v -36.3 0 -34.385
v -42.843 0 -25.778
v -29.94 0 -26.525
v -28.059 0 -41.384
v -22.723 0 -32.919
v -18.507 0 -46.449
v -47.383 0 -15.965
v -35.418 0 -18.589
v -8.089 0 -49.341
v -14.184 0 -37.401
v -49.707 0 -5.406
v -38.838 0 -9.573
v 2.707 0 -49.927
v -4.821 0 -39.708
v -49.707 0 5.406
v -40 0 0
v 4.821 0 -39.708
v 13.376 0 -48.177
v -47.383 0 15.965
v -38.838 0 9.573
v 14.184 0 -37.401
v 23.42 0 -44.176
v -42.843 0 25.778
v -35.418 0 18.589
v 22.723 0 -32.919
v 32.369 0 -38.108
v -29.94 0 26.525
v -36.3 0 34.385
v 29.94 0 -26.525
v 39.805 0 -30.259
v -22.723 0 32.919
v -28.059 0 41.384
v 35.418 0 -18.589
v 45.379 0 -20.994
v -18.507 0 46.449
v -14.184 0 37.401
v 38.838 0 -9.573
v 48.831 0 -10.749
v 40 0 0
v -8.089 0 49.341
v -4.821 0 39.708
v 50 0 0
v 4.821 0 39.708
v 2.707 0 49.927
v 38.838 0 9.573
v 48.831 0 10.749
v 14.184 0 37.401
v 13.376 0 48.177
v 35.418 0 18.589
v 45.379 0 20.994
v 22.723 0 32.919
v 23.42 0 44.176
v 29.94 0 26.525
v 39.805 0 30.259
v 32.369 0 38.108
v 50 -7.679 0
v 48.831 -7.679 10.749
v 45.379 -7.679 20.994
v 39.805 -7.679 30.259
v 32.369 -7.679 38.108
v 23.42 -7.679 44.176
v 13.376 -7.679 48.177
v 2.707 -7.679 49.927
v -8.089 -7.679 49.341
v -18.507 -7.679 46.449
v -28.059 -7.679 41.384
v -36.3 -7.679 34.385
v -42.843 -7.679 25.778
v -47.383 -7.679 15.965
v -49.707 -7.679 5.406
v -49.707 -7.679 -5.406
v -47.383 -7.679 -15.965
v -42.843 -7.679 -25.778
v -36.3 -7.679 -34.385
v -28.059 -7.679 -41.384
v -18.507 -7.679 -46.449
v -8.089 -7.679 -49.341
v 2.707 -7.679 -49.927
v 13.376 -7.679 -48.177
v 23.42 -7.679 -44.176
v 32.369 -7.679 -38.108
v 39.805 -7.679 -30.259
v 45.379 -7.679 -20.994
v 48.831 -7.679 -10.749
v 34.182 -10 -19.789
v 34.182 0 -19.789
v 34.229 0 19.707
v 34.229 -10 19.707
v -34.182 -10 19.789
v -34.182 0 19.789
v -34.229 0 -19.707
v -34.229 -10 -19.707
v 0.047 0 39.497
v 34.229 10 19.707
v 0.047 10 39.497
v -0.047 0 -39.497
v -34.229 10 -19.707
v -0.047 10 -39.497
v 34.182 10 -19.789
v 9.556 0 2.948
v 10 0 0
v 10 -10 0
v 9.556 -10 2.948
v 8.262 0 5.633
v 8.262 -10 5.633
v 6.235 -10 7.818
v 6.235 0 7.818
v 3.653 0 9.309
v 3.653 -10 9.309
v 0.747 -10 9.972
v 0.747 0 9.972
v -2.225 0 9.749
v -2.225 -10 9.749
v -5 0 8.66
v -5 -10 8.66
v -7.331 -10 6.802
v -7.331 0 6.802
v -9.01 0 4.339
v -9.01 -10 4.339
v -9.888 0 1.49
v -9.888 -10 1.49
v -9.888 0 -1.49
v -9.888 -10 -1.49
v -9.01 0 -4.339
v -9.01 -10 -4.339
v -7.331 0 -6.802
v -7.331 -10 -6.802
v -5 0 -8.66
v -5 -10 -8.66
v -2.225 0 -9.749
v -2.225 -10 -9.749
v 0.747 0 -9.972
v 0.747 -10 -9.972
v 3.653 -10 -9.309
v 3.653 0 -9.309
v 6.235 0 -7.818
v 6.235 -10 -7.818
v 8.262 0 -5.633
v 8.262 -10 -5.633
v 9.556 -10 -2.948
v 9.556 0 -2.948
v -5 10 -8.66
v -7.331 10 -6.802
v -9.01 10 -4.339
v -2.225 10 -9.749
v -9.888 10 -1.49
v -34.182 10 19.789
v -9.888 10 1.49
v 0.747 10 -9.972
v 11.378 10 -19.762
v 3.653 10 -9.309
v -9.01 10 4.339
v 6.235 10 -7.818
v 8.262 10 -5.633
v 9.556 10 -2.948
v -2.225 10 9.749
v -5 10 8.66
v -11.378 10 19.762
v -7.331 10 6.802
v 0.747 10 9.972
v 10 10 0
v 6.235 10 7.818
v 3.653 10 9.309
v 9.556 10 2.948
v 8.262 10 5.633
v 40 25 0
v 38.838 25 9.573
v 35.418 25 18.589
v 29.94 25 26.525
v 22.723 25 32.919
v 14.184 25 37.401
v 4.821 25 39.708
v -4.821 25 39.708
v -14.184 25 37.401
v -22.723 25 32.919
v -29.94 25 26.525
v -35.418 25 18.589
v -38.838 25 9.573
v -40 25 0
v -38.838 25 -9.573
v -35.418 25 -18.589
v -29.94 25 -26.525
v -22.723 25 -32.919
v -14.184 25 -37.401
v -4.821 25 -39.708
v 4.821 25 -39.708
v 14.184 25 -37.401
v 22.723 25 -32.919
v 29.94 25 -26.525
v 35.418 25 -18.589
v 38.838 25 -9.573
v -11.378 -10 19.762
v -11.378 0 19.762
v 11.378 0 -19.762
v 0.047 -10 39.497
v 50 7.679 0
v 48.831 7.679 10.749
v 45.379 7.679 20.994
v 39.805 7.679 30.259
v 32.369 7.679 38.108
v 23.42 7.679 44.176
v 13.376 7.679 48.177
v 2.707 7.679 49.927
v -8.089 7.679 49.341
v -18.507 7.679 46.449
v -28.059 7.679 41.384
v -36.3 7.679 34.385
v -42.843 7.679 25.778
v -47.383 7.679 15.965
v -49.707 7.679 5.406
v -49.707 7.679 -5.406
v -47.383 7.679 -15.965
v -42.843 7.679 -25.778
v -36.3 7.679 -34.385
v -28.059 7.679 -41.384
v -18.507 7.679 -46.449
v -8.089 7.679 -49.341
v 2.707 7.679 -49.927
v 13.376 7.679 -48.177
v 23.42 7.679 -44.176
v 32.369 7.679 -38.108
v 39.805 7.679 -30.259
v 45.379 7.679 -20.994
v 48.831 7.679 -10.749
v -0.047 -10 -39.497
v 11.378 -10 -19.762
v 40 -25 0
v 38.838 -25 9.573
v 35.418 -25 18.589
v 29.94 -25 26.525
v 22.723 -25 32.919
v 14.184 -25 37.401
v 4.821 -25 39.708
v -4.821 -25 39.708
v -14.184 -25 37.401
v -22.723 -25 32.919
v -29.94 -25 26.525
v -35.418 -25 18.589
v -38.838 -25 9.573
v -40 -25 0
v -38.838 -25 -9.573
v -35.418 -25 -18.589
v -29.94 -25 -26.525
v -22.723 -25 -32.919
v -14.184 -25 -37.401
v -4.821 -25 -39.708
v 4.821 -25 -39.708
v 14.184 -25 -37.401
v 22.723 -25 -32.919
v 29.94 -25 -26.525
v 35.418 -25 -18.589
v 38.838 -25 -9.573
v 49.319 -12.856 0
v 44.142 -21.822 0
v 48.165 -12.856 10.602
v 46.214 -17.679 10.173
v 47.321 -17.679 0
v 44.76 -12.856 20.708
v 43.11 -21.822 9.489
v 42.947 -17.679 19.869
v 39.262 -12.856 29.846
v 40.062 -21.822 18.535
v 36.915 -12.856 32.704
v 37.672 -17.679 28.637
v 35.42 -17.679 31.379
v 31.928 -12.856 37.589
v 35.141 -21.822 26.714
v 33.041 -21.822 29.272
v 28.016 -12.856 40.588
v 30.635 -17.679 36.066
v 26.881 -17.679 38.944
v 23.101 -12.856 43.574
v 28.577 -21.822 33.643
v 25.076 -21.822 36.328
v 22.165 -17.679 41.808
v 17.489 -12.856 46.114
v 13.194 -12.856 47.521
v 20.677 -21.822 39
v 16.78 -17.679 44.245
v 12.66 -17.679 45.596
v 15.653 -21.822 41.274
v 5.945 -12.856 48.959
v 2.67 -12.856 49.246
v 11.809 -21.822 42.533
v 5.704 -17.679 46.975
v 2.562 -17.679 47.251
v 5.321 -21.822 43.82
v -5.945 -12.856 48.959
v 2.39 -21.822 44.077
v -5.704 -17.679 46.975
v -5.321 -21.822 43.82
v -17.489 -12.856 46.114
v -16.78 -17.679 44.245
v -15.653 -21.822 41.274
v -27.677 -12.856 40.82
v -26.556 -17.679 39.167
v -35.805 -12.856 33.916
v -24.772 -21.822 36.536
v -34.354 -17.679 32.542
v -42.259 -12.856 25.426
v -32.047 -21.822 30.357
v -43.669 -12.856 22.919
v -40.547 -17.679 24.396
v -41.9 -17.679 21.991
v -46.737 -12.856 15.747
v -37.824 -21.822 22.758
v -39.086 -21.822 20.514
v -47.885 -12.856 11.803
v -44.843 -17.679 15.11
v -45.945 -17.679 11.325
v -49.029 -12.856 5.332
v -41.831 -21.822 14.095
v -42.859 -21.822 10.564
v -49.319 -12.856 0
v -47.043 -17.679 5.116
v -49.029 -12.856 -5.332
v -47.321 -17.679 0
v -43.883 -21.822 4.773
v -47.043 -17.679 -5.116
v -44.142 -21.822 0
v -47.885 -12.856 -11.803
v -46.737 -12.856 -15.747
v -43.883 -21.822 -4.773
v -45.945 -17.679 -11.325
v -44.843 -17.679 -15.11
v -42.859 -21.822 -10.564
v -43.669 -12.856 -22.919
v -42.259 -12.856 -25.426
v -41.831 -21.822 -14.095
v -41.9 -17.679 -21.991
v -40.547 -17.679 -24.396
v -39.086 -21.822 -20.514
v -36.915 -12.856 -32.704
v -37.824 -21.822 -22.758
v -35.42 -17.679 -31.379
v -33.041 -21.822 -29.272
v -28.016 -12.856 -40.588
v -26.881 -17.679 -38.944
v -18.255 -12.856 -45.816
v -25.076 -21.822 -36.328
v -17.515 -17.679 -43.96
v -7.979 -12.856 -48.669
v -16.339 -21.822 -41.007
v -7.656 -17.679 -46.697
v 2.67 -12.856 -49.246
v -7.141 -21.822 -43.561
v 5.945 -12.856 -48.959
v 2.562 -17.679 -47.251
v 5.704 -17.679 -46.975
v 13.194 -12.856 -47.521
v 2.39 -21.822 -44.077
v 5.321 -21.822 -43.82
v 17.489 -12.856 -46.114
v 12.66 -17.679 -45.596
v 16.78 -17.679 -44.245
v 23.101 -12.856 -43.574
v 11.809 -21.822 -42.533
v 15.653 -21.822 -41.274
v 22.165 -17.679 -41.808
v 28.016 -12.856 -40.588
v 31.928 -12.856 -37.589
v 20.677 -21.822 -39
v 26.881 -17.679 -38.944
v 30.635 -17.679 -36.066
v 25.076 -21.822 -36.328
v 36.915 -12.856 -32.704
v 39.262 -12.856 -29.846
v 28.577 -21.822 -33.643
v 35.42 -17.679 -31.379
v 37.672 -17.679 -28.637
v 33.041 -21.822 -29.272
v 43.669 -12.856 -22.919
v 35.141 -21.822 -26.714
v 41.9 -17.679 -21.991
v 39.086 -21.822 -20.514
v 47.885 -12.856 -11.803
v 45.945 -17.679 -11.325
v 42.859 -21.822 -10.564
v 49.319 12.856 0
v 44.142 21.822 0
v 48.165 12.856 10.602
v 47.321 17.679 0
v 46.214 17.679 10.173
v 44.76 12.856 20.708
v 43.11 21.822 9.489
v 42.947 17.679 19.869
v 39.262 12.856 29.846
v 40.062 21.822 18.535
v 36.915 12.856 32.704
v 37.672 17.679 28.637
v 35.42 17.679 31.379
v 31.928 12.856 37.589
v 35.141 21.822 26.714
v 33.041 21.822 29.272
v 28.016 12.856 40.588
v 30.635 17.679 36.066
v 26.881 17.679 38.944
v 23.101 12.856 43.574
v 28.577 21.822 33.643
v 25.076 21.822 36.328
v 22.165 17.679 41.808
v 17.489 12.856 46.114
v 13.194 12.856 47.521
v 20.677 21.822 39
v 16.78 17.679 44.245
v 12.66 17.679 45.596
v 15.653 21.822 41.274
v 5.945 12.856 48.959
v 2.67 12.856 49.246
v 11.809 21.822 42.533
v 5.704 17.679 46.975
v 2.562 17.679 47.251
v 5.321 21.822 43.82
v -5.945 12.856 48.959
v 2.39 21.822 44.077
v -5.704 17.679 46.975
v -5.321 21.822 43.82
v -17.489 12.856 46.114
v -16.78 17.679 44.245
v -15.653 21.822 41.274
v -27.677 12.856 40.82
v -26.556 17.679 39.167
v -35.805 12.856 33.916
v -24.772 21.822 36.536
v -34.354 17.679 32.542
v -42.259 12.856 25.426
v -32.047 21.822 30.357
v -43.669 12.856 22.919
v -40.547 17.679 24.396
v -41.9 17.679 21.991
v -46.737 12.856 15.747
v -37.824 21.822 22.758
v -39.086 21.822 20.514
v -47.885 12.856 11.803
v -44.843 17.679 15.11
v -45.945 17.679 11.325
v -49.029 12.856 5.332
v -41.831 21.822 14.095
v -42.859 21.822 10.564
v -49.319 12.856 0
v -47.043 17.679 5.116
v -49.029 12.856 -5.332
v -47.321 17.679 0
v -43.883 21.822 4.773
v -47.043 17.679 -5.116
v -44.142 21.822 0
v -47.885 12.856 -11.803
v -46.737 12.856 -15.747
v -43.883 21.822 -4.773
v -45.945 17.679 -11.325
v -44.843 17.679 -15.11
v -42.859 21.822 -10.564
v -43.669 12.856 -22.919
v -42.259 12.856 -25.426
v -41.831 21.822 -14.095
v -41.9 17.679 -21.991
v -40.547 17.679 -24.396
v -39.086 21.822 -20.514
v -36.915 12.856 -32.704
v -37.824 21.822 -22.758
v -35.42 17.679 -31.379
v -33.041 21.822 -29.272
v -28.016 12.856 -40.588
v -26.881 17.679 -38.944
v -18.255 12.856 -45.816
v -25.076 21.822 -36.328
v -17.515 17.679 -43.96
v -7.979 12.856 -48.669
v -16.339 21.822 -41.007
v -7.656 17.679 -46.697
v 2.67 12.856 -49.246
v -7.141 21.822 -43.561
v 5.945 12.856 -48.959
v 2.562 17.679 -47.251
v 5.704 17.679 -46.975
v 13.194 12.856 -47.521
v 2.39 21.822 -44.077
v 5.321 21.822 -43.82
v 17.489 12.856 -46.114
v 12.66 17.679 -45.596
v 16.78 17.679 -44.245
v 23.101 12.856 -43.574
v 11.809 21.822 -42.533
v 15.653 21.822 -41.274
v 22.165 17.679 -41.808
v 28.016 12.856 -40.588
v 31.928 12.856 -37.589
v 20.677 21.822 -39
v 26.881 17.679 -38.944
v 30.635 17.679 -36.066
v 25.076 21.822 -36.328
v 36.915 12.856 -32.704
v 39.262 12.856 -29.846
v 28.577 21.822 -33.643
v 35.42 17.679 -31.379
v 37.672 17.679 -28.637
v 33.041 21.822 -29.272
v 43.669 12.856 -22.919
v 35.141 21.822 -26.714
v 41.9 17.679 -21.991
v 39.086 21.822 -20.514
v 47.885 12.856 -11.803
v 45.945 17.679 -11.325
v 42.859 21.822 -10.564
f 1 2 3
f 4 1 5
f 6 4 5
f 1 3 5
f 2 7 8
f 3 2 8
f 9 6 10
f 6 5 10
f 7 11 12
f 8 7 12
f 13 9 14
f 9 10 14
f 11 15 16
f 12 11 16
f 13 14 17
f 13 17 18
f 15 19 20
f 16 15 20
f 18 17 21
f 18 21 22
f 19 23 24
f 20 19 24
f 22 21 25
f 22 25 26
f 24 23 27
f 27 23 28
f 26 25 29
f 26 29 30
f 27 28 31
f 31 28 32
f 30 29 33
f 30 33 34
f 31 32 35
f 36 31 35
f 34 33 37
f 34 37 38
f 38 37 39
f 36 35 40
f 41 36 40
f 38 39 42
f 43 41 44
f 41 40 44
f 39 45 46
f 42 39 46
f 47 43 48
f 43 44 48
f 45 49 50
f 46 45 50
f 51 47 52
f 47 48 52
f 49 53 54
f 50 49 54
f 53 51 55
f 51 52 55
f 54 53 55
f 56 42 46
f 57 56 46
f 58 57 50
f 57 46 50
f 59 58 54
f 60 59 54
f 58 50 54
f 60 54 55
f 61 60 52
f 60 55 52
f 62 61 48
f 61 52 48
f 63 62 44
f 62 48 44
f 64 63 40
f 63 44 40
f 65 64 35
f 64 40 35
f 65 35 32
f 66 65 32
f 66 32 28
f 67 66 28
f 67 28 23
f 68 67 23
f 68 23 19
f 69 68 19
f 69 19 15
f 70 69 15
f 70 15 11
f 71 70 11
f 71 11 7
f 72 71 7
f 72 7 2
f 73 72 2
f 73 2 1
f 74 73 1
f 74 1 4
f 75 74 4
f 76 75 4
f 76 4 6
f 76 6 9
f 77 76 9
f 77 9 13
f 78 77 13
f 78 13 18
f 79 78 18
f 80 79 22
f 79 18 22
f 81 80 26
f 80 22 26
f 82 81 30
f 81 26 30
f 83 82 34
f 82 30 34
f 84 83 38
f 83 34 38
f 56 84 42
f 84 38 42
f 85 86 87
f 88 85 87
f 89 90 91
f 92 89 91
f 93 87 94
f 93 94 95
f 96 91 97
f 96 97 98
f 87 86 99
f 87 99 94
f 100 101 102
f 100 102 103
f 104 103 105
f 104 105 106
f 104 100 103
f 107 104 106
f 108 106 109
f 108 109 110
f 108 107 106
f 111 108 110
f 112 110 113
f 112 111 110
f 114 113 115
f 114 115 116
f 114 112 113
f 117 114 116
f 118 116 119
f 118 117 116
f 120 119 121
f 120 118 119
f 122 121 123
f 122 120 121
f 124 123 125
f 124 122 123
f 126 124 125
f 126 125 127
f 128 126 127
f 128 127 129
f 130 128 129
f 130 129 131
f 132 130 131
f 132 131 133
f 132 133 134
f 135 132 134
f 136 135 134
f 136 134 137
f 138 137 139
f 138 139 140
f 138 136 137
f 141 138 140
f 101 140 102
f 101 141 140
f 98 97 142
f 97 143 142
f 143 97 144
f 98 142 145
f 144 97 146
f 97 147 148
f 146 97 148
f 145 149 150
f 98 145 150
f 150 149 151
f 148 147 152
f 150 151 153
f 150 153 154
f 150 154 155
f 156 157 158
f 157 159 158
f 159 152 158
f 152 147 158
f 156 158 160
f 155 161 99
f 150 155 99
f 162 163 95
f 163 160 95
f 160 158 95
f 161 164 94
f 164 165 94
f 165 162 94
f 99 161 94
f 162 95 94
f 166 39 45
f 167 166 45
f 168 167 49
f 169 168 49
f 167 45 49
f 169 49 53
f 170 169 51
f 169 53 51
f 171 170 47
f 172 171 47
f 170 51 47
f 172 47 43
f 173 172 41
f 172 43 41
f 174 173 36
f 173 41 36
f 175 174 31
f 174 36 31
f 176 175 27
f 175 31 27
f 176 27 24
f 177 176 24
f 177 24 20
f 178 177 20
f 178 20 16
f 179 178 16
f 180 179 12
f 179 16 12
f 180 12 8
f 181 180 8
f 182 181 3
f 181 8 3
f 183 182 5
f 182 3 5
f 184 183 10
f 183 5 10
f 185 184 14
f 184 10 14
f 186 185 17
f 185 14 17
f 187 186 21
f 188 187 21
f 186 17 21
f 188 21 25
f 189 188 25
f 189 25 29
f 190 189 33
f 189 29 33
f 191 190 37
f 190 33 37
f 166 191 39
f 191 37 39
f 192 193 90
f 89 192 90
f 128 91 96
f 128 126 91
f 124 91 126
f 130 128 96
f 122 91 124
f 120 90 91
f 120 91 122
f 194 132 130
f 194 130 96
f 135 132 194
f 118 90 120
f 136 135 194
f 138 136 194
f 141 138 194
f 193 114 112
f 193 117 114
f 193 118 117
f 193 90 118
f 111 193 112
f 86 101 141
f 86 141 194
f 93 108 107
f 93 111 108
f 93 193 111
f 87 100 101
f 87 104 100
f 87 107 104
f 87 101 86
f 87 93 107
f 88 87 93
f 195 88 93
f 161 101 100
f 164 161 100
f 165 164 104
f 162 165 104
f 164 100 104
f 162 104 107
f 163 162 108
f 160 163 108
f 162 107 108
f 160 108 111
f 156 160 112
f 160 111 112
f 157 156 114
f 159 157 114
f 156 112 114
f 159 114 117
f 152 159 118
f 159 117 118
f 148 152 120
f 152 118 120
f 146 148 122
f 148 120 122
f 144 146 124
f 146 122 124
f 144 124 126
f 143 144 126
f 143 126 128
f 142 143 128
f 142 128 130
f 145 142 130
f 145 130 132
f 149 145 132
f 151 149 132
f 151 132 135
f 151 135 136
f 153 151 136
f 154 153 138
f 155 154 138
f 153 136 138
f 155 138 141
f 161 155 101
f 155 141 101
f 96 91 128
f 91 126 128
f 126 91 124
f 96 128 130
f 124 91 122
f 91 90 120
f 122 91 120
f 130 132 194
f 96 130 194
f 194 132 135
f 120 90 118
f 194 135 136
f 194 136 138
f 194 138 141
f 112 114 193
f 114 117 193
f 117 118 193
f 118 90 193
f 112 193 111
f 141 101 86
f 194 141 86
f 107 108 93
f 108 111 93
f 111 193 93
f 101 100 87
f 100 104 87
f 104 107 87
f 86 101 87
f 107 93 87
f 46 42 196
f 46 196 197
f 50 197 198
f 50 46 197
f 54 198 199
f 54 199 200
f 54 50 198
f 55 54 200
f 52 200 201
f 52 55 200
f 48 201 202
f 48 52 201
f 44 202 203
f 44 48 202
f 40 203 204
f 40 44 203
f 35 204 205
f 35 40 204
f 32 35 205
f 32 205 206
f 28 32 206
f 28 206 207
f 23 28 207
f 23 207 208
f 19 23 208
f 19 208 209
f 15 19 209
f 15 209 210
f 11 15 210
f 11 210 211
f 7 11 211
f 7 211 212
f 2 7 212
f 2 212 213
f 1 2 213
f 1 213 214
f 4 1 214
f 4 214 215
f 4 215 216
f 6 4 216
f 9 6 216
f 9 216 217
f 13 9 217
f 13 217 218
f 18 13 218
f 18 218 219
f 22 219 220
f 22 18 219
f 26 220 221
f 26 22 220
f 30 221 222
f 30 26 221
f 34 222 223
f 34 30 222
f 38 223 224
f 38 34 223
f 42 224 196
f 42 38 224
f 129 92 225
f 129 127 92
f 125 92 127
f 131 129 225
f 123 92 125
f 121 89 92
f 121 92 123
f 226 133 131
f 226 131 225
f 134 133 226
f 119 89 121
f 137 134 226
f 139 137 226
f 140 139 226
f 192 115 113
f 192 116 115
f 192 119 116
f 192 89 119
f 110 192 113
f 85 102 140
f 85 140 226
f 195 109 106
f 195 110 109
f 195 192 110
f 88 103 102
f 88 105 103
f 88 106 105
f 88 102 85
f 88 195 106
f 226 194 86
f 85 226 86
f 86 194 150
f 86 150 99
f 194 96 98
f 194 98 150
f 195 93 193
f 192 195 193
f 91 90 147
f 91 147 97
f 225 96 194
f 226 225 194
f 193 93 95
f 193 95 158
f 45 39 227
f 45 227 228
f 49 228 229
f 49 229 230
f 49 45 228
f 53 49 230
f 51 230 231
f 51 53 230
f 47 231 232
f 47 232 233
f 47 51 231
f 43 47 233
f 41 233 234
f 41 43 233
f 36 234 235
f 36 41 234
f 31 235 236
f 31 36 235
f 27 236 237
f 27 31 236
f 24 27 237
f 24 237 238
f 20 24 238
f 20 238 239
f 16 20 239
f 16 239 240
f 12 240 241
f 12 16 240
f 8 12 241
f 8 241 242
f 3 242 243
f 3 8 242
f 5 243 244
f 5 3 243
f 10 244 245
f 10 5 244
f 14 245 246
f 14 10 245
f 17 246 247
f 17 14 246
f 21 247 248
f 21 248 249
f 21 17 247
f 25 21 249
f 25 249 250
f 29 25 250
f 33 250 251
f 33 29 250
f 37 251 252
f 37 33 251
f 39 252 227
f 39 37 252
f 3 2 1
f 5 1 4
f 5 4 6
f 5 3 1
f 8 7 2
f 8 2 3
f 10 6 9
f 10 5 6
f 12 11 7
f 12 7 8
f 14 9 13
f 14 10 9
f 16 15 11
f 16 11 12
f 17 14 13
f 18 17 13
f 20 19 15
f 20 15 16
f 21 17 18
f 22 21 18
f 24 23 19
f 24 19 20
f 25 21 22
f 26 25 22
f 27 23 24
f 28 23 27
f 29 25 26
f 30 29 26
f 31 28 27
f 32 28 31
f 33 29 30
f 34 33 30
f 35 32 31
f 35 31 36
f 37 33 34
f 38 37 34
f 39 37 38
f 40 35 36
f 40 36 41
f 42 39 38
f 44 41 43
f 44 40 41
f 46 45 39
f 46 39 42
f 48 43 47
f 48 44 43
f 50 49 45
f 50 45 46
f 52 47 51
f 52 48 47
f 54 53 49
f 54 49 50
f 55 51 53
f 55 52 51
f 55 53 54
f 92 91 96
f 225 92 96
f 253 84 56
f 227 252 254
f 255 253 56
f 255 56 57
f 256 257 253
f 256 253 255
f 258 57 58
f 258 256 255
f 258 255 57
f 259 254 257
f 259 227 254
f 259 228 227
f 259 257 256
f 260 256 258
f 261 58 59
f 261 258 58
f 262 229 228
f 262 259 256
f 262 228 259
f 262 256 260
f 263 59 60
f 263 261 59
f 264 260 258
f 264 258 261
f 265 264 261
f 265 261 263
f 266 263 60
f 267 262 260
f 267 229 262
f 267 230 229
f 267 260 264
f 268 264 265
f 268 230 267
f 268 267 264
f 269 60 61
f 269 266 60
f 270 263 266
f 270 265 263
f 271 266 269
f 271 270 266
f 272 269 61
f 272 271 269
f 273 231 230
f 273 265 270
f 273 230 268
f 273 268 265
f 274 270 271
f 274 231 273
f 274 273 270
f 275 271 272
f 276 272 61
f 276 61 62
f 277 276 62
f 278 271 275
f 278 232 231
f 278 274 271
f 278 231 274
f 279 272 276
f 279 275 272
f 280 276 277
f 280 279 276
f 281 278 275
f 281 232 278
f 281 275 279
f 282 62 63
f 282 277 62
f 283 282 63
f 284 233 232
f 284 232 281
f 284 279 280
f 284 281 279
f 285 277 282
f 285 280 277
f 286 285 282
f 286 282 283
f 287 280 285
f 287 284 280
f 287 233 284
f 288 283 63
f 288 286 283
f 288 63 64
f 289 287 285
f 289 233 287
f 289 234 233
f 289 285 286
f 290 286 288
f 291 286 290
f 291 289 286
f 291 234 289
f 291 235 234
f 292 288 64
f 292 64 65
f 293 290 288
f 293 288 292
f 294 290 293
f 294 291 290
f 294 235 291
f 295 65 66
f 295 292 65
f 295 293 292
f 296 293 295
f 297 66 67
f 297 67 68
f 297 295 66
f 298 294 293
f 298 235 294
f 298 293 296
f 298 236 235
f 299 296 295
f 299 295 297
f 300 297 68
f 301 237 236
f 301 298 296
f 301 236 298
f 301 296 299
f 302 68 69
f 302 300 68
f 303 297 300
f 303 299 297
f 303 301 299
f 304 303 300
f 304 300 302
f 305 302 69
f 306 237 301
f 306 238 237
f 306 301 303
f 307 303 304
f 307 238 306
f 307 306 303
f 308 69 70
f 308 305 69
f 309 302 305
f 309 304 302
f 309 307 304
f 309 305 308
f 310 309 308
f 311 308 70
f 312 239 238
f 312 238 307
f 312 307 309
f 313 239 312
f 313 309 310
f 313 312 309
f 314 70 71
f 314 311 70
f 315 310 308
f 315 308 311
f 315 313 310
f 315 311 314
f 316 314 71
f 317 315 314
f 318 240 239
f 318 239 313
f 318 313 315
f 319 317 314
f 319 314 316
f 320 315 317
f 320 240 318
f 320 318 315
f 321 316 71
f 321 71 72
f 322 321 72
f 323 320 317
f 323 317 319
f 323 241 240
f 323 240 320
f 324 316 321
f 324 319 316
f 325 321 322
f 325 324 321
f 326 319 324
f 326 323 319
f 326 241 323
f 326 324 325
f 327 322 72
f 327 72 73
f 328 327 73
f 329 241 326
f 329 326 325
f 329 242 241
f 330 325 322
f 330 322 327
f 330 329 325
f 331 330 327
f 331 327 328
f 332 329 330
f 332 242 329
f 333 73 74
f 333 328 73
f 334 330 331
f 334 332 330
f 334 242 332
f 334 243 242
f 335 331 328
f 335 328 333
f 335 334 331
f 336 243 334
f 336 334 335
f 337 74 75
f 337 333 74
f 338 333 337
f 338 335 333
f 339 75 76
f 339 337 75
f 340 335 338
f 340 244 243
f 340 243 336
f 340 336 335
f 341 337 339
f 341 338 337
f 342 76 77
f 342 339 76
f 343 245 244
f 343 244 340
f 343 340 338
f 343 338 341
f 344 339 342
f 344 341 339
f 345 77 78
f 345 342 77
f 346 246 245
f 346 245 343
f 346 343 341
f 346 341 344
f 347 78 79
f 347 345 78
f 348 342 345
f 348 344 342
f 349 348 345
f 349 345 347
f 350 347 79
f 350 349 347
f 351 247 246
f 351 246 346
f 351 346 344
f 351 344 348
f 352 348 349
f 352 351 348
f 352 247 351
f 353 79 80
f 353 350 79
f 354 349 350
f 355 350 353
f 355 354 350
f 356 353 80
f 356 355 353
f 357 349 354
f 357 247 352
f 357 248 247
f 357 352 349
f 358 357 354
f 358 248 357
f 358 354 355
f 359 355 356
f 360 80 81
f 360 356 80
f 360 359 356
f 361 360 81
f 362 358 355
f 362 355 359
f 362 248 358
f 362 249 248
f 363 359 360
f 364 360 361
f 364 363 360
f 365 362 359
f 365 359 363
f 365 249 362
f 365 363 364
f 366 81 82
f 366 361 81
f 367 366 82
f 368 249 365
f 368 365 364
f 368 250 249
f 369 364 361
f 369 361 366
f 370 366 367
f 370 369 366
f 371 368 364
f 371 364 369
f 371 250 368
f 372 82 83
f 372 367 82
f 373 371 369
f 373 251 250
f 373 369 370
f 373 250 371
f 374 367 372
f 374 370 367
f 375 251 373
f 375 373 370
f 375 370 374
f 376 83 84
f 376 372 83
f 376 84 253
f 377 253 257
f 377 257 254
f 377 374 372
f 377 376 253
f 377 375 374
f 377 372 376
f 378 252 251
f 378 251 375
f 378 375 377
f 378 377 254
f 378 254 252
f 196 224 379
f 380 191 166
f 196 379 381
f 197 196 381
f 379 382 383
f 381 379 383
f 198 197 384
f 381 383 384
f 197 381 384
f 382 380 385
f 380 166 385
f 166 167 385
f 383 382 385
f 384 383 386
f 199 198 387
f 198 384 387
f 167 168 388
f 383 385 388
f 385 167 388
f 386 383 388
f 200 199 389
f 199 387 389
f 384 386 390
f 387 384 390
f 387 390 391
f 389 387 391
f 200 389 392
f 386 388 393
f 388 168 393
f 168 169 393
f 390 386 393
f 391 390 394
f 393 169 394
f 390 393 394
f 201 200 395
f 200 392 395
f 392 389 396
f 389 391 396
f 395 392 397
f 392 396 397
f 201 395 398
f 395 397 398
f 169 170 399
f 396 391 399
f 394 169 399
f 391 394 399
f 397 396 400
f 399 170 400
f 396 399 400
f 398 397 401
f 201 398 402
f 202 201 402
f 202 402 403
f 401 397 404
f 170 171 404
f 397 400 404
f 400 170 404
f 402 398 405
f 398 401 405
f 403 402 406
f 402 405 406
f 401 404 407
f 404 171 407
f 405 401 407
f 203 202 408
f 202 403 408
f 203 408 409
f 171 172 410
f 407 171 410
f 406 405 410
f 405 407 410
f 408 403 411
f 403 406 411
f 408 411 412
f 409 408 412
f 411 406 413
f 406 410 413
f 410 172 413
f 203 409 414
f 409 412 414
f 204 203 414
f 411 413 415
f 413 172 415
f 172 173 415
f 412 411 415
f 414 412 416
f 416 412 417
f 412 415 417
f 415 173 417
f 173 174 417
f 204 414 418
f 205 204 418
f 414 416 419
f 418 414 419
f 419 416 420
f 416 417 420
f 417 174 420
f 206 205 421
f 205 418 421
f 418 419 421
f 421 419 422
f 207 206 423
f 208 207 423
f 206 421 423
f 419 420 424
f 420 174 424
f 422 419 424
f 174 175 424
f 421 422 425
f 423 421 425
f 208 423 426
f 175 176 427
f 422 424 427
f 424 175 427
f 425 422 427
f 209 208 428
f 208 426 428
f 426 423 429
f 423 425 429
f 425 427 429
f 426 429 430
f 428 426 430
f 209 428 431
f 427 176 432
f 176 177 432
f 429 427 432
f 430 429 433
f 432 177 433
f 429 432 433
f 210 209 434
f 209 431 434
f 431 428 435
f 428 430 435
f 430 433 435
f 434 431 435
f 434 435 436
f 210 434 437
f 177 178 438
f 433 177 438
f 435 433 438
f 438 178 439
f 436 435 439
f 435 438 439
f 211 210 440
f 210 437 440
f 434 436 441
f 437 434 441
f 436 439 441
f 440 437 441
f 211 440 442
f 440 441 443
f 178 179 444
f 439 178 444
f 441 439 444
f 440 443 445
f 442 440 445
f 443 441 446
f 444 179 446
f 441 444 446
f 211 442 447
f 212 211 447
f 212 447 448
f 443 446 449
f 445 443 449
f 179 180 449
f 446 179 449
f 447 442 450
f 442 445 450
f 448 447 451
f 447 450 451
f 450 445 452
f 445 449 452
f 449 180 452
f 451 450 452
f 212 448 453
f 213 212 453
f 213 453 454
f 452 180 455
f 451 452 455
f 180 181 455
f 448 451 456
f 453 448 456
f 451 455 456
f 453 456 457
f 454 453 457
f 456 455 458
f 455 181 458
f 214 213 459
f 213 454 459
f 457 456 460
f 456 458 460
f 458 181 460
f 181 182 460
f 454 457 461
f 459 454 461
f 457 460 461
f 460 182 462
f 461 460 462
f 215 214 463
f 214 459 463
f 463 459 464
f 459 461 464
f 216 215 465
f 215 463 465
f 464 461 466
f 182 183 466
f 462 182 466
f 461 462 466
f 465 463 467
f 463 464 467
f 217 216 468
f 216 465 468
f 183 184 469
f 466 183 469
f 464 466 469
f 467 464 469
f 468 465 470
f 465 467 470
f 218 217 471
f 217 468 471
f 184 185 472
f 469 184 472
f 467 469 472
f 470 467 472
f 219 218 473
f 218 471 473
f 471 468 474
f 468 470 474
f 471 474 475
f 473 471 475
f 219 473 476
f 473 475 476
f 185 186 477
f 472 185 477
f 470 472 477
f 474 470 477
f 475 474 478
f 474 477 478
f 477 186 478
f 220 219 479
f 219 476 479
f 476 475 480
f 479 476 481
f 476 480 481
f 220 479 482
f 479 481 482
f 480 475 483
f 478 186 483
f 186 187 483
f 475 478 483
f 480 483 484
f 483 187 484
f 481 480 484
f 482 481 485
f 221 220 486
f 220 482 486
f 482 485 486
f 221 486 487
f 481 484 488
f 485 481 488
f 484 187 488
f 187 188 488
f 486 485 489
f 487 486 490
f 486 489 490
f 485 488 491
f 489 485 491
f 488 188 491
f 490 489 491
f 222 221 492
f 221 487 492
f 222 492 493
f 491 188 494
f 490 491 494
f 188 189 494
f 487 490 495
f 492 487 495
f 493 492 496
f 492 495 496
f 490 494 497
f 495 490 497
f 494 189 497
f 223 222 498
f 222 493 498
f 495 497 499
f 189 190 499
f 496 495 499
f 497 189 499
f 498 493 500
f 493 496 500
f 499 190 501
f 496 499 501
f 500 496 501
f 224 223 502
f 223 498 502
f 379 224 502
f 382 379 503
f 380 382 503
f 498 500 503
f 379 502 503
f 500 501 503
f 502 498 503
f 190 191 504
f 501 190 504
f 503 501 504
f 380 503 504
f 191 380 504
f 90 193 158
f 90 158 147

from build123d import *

# Parameters (mm, degrees)
F0_R     = 10
F1_DEPTH = 10
F0_R_2   = 50
F0_R_3   = 40
F2_DEPTH = 25


# Not quite as in the source:
# - a fillet or chamfer that OpenCascade refuses, or shapes differently, is made with other operations: its cross-section is extruded or revolved along the edge and cut away or added


with BuildPart() as f1:
    # F0 (on Front) → F1 (new body)
    with BuildSketch(Plane.XZ):
        Polygon((34.228804297, 19.707416502), (0.0472788148, 39.4967223134), (-11.3780822225, 19.7620093749), (-34.1815254822, 19.7893058113), (-34.228804297, -19.707416502), (-0.0472788148, -39.4967223134), (11.3780822225, -19.7620093749), (34.1815254822, -19.7893058113), align=None)
        Circle(F0_R, mode=Mode.SUBTRACT)
    extrude(amount=F1_DEPTH)


with BuildPart() as f2:
    # F0 (on Front) → F2 (new body)
    with BuildSketch(Plane.XZ):
        Circle(F0_R_2)
        Circle(F0_R_3, mode=Mode.SUBTRACT)
    extrude(amount=F2_DEPTH)


with BuildPart() as f3_1:
    # F3: instance of F2
    add(f2.part.mirror(Plane.XZ))

    # F4#2: fillet of radius 20 on 1 edges, made by hand

    # F4_2_s1 → F4_2_t2 (revolve, cut)
    with BuildSketch(Plane.XY):
        with BuildLine():
            ThreePointArc((50, 7.6794919243), (47.3205080757, 17.6794919243), (40, 25))
            Line((40, 25), (50, 25))
            Line((50, 25), (50, 7.6794919243))
        make_face()
    revolve(axis=Axis((0, 25, 0), (0, -1, 0)), mode=Mode.SUBTRACT)


with BuildPart() as f3_2:
    # F3: instance of F1
    add(f1.part.mirror(Plane.XZ))


with BuildPart() as f2_1:
    add(f2.part)

    # F4: fillet of radius 20 on 1 edges, made by hand

    # F4_s1 → F4_t2 (revolve, cut)
    with BuildSketch(Plane.XY):
        with BuildLine():
            ThreePointArc((50, -7.6794919243), (47.3205080757, -17.6794919243), (40, -25))
            Line((40, -25), (50, -25))
            Line((50, -25), (50, -7.6794919243))
        make_face()
    revolve(axis=Axis((0, -25, 0), (0, -1, 0)), mode=Mode.SUBTRACT)


solid = Compound([f1.part, f3_1.part, f3_2.part, f2_1.part])
